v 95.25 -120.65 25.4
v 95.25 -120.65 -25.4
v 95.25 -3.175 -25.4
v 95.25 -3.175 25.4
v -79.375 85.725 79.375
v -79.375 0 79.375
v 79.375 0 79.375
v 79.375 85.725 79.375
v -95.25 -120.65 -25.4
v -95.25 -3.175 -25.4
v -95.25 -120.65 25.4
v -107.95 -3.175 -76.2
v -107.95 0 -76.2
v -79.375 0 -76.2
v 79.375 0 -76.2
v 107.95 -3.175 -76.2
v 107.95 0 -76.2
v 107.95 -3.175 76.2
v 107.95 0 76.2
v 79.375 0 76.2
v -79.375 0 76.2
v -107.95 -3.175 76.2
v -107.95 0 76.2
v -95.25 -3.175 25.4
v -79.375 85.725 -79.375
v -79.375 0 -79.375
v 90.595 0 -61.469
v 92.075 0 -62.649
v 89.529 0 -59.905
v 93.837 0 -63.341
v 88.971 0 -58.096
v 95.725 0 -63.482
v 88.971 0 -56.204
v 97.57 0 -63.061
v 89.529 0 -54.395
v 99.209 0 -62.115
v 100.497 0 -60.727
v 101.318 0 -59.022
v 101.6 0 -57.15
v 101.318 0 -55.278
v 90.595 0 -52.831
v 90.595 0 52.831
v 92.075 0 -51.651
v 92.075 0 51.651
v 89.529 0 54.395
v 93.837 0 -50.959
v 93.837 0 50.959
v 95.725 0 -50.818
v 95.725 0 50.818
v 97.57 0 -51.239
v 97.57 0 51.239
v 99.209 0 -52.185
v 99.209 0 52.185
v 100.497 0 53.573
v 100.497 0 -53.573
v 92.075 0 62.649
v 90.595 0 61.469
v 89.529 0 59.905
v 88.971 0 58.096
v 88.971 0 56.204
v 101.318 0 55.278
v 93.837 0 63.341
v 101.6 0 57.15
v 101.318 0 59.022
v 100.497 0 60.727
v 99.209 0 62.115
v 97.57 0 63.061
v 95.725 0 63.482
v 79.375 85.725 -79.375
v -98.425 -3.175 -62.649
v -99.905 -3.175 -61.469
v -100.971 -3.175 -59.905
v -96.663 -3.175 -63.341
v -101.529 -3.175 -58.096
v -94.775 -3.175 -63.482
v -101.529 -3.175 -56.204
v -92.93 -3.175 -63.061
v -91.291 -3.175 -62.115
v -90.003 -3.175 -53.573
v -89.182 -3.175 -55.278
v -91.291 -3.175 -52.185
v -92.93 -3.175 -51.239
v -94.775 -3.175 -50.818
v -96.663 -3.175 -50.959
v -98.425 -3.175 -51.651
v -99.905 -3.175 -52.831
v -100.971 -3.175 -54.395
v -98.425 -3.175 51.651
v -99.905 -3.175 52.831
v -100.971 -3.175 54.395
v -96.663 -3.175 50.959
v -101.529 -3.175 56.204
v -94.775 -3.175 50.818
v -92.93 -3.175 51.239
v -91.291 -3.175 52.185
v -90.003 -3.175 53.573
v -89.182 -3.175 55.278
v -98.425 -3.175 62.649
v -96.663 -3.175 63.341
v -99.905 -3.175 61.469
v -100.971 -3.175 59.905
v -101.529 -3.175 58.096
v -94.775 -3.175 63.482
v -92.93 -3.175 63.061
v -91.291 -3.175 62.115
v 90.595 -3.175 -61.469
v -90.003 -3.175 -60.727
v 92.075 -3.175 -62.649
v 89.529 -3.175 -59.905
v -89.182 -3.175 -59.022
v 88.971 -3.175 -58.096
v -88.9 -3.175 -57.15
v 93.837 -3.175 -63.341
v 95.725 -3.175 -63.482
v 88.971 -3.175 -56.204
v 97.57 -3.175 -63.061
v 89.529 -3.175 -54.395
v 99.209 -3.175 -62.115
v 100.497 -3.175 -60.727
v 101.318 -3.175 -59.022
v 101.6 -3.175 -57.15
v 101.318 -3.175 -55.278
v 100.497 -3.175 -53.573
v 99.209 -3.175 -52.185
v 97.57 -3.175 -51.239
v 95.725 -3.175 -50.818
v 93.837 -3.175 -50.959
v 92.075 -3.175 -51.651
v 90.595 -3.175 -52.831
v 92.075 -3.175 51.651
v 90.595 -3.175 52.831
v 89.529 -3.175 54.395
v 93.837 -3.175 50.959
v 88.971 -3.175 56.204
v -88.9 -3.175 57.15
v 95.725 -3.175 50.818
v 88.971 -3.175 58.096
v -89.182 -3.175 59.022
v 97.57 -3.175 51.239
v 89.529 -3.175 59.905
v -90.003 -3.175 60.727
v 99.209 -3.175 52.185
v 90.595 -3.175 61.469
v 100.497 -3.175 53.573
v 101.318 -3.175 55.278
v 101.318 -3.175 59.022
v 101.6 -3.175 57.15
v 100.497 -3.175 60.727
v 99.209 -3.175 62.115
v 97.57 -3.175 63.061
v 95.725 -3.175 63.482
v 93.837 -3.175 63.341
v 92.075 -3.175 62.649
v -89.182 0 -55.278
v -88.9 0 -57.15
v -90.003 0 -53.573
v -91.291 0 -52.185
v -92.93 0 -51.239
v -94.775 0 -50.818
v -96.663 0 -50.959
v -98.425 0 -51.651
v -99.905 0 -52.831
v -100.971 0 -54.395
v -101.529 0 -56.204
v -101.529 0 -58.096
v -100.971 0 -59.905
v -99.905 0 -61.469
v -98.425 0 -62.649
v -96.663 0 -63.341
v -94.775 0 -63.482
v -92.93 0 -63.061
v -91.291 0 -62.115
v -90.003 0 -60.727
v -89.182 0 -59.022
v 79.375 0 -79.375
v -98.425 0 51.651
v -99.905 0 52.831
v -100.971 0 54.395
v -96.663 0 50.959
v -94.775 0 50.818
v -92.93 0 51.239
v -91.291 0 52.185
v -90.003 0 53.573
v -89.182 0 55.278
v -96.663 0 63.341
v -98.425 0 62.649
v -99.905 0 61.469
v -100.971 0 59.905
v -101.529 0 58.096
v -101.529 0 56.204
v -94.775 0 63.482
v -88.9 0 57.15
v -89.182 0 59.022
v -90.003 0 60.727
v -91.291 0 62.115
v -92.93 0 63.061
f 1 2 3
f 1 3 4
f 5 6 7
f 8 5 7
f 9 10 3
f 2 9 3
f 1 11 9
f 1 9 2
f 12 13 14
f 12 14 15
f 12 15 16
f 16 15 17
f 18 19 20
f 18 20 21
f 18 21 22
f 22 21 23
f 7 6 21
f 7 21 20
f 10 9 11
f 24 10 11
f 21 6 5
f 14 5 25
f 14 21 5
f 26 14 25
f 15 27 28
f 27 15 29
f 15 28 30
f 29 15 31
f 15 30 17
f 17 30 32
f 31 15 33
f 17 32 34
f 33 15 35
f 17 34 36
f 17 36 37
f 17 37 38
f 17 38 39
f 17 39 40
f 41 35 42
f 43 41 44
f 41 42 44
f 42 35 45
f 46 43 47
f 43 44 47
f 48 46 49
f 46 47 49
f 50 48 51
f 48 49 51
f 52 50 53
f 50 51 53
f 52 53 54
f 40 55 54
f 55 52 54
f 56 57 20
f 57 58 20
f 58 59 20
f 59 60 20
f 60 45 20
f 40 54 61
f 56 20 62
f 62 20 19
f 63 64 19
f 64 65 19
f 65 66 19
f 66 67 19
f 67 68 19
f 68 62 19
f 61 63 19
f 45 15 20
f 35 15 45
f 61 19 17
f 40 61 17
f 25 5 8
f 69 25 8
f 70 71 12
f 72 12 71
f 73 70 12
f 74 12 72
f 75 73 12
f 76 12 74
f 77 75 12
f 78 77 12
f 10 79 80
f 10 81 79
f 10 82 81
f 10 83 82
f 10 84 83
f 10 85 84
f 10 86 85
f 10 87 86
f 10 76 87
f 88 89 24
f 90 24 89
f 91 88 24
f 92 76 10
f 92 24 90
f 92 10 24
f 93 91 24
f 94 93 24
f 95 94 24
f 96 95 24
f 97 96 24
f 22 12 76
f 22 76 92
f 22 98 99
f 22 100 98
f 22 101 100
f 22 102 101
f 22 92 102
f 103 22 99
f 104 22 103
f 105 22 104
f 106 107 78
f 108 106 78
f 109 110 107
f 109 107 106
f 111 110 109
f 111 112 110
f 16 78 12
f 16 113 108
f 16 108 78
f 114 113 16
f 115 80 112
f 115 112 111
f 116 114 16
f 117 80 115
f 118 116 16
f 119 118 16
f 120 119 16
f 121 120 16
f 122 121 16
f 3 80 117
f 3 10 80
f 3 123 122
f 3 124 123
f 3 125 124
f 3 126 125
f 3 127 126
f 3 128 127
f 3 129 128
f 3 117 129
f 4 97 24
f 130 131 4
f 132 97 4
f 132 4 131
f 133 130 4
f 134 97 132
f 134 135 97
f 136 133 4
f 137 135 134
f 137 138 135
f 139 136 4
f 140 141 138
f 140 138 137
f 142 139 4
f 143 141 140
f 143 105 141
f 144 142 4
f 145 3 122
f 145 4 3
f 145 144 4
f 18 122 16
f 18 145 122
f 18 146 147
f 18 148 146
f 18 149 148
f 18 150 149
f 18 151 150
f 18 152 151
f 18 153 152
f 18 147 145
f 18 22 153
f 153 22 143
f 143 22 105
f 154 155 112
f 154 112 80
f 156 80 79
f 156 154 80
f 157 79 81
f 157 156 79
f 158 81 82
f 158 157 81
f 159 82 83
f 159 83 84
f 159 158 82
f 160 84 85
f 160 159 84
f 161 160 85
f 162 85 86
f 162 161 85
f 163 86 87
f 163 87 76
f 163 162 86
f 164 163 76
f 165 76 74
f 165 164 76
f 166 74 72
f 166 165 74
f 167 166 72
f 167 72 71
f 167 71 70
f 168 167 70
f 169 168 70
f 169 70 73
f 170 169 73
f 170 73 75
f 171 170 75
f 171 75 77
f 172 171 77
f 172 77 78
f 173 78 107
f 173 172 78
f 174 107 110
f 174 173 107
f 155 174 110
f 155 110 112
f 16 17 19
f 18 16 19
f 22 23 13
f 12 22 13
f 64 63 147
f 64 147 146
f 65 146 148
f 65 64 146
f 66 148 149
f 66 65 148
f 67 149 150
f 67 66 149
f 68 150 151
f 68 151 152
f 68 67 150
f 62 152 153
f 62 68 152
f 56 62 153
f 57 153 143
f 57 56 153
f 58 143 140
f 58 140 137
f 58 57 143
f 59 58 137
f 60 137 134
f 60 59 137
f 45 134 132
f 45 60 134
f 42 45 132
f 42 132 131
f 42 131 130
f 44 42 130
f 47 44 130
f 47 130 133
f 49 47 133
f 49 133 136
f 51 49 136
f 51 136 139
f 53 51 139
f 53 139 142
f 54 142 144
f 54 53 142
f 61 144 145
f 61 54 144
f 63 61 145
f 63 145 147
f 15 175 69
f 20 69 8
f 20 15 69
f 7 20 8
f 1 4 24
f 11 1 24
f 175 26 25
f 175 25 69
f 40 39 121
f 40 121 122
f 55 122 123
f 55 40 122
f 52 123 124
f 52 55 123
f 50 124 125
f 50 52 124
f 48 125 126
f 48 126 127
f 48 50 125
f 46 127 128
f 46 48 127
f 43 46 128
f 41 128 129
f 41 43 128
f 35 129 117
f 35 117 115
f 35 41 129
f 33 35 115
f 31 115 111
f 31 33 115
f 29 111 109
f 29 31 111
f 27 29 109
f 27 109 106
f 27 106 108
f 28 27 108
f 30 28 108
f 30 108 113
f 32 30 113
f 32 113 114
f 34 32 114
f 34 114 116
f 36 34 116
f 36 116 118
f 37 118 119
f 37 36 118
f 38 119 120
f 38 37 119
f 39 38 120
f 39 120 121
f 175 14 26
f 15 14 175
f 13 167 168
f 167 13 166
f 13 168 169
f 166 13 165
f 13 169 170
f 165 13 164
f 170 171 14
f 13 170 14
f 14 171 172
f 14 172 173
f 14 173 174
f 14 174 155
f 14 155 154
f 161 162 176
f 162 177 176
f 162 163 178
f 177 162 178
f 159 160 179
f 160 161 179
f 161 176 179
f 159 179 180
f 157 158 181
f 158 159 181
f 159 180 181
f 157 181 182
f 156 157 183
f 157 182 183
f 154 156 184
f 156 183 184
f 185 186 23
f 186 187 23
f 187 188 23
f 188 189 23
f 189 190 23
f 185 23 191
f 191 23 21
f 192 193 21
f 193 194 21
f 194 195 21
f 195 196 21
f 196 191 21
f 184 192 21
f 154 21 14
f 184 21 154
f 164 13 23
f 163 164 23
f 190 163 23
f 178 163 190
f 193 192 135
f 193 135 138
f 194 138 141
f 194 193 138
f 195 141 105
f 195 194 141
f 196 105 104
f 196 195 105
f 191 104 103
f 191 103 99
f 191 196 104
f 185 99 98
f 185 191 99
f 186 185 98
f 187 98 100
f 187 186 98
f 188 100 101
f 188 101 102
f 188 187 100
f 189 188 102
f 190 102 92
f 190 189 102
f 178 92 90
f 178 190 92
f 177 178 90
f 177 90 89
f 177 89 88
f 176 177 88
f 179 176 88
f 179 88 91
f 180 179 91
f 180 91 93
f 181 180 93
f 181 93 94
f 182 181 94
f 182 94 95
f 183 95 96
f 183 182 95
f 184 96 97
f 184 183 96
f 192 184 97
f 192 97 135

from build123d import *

# Parameters (mm, degrees)
F0_W     = 158.75
F0_H     = 50.8
F0_R     = 6.35
F0_W_2   = 15.875
F1_DEPTH = 3.175
F0_H_2   = 3.175
F2_DEPTH = 85.725
F3_DEPTH = 120.65


with BuildPart() as f1:
    # F0 (on Front) → F1 (new body)
    with BuildSketch(Plane.XZ):
        with Locations((0, -50.8)):
            Rectangle(F0_W, F0_H)
        with Locations((0, 50.8)):
            Rectangle(F0_W, F0_H)
        Polygon((95.25, 25.4), (95.25, -25.4), (79.375, -25.4), (79.375, -76.2), (107.95, -76.2), (107.95, 76.2), (79.375, 76.2), (79.375, 25.4), align=None)
        with Locations((95.25, -57.15)):
            Circle(F0_R, mode=Mode.SUBTRACT)
        with Locations((95.25, 57.15)):
            Circle(F0_R, mode=Mode.SUBTRACT)
        Polygon((-79.375, -76.2), (-79.375, -25.4), (-95.25, -25.4), (-95.25, 25.4), (-79.375, 25.4), (-79.375, 76.2), (-107.95, 76.2), (-107.95, -76.2), align=None)
        with Locations((-95.25, -57.15)):
            Circle(F0_R, mode=Mode.SUBTRACT)
        with Locations((-95.25, 57.15)):
            Circle(F0_R, mode=Mode.SUBTRACT)
        Rectangle(F0_W, F0_H)
        with Locations((-87.3125, 0)):
            Rectangle(F0_W_2, F0_H)
        with Locations((87.3125, 0)):
            Rectangle(F0_W_2, F0_H)
    extrude(amount=F1_DEPTH)

    # F0 (on Front) → F2 (join)
    with BuildSketch(Plane.XZ):
        with Locations((0, -50.8)):
            Rectangle(F0_W, F0_H)
        Rectangle(F0_W, F0_H)
        with Locations((0, 50.8)):
            Rectangle(F0_W, F0_H)
        with Locations((0, 77.7875)):
            Rectangle(F0_W, F0_H_2)
        with Locations((0, -77.7875)):
            Rectangle(F0_W, F0_H_2)
    extrude(amount=-F2_DEPTH)

    # F0 (on Front) → F3 (join)
    with BuildSketch(Plane.XZ):
        with Locations((-87.3125, 0)):
            Rectangle(F0_W_2, F0_H)
        Rectangle(F0_W, F0_H)
        with Locations((87.3125, 0)):
            Rectangle(F0_W_2, F0_H)
    extrude(amount=F3_DEPTH)


solid = f1.part
